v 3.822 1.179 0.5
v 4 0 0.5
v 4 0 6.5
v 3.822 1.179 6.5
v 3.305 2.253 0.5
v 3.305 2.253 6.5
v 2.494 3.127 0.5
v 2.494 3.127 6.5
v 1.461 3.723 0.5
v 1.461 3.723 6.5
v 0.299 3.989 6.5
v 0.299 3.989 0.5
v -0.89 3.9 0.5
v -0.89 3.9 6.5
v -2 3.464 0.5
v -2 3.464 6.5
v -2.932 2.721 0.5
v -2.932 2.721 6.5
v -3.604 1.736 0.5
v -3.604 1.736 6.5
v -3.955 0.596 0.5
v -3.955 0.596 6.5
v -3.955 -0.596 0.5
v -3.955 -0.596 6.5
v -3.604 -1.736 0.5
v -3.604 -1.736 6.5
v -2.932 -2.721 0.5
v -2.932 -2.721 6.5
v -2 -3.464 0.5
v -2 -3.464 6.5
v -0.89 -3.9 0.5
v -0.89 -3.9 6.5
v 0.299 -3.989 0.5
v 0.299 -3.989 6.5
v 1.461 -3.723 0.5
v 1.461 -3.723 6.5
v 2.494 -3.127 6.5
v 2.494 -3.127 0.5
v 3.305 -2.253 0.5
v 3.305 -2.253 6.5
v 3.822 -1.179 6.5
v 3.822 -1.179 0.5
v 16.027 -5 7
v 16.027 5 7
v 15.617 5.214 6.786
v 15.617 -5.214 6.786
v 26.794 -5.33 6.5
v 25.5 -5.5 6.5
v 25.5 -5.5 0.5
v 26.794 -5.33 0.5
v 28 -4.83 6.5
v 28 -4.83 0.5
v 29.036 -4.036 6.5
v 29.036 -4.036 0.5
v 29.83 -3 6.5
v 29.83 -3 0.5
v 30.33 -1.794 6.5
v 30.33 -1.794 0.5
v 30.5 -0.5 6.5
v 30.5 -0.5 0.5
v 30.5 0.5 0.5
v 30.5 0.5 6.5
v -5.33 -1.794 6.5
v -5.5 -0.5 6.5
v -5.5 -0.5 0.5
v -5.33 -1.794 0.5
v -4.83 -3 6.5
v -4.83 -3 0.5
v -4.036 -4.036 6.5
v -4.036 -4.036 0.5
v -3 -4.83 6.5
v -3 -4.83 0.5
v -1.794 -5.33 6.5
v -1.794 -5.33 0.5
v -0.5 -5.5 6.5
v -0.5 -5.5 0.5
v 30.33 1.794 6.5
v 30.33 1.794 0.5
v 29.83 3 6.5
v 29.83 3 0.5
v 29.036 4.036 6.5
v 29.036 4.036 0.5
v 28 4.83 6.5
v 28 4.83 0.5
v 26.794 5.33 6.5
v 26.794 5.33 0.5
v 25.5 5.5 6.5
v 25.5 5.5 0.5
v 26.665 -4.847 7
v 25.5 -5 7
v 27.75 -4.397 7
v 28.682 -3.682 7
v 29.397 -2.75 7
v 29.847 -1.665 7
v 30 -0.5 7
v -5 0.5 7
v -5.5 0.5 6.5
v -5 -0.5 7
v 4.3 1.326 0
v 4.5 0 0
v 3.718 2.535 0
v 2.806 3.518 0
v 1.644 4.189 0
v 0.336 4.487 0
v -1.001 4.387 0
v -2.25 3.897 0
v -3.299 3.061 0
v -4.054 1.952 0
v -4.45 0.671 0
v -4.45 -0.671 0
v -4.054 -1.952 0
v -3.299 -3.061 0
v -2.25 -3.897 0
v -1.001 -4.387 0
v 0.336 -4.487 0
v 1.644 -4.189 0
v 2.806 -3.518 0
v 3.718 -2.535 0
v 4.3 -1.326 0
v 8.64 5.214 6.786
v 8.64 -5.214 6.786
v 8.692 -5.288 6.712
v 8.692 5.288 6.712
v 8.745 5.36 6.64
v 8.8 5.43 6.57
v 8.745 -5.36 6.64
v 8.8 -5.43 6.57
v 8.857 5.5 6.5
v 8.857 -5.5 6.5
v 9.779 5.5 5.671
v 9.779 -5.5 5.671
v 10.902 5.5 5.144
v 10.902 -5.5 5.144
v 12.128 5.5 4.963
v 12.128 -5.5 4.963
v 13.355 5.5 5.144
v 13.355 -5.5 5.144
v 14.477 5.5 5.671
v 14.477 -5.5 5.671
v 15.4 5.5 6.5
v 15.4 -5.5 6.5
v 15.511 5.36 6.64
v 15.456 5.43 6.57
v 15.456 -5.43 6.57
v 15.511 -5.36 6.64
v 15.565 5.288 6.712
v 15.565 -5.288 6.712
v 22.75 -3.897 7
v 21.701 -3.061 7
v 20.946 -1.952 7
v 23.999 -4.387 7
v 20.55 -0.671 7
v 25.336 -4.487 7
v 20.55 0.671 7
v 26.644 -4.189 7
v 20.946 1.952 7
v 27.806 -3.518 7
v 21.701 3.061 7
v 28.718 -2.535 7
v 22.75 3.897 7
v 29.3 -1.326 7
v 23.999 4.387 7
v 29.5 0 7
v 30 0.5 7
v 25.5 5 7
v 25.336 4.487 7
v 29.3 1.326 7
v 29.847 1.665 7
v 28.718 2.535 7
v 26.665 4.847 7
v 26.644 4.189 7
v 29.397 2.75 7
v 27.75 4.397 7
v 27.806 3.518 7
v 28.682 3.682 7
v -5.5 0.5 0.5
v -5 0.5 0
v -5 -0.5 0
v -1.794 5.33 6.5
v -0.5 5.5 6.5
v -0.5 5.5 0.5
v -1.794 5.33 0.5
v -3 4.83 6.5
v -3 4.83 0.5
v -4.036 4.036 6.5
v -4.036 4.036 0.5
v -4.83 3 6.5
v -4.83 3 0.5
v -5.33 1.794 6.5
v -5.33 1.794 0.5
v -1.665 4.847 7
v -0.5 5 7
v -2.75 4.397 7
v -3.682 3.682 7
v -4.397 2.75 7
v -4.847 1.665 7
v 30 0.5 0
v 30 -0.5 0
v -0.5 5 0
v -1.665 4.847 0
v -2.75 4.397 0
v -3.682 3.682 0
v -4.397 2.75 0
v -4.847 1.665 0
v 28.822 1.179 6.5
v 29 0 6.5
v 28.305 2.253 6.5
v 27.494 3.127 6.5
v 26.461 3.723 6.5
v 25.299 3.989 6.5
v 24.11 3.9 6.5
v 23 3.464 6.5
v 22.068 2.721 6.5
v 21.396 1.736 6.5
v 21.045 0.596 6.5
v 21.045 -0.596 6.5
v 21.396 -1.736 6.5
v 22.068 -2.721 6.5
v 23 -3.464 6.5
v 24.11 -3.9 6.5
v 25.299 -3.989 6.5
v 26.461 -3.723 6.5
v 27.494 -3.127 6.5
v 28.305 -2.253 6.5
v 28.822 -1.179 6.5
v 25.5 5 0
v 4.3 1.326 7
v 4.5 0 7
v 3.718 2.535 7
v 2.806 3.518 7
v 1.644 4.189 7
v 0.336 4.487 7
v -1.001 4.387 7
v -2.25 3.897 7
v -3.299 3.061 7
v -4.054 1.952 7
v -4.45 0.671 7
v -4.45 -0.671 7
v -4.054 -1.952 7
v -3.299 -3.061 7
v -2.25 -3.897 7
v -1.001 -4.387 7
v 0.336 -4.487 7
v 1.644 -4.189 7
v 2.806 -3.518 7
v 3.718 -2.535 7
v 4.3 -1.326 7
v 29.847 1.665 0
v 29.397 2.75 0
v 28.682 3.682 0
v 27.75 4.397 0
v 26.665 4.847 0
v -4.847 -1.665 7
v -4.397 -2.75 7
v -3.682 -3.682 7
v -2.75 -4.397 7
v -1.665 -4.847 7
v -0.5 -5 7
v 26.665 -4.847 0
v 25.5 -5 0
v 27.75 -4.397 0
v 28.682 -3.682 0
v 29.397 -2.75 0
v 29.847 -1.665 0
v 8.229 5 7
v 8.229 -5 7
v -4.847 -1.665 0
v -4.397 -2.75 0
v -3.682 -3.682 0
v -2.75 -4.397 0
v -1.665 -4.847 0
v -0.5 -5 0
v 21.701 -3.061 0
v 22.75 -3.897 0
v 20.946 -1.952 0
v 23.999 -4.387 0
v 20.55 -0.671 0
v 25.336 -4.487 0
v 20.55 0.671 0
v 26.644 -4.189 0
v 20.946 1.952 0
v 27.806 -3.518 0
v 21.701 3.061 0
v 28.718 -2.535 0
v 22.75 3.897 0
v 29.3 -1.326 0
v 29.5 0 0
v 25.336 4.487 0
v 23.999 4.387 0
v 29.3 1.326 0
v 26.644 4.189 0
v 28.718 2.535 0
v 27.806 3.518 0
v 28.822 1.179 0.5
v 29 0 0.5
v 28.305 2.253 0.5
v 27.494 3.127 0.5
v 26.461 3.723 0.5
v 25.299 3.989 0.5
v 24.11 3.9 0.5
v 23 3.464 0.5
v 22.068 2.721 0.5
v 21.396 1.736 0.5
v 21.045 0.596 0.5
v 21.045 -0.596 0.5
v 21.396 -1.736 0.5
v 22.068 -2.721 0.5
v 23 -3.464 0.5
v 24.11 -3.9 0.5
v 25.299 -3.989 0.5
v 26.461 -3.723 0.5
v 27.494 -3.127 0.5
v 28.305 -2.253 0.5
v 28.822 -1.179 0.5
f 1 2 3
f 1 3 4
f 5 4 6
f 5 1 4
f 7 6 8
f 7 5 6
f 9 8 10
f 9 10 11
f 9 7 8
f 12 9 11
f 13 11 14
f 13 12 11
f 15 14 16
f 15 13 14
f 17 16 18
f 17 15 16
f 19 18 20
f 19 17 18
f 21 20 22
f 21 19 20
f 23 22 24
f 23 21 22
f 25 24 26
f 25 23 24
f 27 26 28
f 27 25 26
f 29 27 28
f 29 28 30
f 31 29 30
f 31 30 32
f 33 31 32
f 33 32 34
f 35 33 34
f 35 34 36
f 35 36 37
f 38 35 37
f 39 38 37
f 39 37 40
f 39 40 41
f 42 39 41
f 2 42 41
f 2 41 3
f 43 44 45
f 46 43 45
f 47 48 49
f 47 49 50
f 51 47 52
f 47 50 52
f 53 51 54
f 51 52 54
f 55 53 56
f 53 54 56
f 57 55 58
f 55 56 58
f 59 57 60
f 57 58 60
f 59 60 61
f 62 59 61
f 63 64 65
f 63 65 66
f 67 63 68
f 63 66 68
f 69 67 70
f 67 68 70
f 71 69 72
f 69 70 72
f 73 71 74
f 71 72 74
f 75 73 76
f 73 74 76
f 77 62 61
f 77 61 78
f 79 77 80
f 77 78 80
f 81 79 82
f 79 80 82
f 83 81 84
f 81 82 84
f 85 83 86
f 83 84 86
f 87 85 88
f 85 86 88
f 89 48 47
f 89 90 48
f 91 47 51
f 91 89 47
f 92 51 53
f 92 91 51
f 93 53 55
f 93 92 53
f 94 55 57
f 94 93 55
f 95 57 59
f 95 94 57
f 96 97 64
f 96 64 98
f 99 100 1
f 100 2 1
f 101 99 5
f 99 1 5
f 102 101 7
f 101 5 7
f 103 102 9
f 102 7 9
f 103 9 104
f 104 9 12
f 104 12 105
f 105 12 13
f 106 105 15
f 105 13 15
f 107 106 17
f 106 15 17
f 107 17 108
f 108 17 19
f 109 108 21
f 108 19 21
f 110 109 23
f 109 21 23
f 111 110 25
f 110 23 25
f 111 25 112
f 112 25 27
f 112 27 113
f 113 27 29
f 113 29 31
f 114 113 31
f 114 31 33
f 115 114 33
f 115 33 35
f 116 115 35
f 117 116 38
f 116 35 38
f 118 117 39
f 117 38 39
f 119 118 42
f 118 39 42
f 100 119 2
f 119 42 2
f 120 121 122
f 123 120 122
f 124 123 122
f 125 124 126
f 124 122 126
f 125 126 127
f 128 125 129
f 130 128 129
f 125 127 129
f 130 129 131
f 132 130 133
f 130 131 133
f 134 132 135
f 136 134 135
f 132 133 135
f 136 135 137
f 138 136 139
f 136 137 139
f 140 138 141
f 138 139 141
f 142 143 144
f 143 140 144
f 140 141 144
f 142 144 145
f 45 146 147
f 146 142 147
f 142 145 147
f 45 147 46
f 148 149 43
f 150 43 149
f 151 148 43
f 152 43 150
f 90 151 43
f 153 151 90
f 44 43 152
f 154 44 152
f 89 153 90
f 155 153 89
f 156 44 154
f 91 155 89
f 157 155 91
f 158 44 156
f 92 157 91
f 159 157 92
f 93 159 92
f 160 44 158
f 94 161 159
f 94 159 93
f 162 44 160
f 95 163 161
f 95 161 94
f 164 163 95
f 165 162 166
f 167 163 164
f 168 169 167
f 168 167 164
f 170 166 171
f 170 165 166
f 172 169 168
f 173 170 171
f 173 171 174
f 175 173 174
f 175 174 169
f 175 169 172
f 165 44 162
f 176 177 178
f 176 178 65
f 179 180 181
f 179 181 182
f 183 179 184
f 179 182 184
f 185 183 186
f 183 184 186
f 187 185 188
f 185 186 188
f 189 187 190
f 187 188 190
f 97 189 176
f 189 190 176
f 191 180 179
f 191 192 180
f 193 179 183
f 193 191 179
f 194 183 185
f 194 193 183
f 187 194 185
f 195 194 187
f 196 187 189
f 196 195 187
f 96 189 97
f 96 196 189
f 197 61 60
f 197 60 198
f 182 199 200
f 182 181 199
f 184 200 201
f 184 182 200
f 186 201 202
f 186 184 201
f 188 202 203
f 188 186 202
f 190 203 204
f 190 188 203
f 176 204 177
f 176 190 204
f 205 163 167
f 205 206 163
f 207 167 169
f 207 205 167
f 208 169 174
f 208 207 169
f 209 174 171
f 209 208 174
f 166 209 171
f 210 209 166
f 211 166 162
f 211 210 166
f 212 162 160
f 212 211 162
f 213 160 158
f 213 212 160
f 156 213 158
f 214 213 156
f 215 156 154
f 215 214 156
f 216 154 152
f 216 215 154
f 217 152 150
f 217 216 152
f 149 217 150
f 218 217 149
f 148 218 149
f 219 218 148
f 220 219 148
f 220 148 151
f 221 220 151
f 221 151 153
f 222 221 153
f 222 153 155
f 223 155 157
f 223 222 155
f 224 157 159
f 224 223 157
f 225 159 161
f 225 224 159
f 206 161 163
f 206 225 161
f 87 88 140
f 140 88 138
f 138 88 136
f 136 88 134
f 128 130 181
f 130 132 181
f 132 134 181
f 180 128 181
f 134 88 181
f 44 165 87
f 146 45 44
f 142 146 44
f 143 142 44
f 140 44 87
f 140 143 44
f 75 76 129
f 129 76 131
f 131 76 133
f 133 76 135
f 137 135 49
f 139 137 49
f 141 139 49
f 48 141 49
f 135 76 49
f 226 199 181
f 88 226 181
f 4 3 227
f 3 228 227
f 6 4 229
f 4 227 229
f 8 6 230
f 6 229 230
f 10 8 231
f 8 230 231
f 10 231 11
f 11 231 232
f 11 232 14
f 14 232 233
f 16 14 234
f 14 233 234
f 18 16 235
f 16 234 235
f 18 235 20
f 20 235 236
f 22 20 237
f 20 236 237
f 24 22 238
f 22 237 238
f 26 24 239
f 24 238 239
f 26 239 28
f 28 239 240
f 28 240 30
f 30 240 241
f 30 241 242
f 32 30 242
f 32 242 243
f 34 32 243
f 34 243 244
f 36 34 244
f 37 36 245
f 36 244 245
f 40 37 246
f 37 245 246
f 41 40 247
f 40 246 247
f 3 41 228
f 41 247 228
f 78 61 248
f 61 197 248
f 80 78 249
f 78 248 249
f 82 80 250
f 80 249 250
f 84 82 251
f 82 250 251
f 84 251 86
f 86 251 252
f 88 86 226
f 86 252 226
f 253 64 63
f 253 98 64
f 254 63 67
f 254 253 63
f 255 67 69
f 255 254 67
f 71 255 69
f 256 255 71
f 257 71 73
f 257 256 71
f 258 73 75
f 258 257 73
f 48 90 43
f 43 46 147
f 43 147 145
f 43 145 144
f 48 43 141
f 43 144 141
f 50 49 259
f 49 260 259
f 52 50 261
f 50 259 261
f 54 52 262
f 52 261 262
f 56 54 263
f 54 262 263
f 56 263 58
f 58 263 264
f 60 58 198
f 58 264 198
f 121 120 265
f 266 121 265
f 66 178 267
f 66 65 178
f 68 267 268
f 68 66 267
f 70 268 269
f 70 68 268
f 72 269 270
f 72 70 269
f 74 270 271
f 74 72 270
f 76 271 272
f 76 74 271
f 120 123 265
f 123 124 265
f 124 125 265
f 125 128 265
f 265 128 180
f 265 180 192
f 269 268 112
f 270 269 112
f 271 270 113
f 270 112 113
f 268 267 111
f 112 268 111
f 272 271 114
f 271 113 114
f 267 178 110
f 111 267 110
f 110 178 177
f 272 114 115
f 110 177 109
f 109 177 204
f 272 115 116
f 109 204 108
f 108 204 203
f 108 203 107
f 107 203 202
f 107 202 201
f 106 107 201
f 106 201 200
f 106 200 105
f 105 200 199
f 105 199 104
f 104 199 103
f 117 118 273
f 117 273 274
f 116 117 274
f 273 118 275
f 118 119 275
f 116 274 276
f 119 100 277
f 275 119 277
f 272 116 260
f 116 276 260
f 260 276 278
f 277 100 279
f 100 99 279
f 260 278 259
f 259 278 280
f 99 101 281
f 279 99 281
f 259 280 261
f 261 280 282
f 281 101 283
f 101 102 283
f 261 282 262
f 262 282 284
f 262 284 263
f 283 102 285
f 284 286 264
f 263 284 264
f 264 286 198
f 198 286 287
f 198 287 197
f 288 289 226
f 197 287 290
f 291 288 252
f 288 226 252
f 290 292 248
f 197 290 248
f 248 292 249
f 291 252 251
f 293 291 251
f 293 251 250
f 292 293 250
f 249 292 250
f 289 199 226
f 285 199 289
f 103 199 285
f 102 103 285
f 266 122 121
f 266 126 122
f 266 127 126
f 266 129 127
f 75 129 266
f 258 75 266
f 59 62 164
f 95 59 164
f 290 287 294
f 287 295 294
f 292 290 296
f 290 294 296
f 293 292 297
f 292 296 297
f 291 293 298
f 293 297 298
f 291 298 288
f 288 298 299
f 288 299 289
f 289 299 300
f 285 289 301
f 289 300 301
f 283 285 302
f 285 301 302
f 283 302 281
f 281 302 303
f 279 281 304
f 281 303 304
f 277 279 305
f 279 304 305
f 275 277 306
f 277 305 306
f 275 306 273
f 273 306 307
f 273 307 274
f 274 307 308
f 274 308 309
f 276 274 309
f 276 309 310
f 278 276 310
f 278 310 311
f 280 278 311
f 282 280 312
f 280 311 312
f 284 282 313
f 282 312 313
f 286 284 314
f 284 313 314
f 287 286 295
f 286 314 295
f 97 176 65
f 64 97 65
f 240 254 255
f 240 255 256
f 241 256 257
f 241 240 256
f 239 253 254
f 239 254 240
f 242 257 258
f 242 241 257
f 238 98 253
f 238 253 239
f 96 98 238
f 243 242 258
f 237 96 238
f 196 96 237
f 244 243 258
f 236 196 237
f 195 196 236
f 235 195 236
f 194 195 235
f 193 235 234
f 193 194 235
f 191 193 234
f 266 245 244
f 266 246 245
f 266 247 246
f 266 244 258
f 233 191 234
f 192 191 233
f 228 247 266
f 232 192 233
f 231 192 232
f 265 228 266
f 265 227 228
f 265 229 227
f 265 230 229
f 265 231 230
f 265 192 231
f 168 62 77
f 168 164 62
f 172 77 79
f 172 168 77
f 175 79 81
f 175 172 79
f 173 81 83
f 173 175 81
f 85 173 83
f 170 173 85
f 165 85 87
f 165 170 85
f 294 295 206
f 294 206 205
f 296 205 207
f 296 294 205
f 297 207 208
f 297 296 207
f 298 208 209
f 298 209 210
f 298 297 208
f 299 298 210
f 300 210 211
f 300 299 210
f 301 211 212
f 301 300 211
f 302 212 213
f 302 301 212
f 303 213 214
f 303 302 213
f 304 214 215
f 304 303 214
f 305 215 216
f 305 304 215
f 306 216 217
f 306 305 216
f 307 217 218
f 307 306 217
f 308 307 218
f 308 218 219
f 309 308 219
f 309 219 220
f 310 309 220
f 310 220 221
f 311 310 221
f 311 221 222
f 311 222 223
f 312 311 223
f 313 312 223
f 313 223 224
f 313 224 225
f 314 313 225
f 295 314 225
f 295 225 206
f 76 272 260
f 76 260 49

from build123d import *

# Parameters (mm, degrees)
F0_R         = 4
F1_DEPTH     = 7
F3_DEPTH     = 25
F4_T1_DEPTH  = 26
F4_T3_DEPTH  = 1
F4_T5_DEPTH  = 10.285841494
F4_T7_DEPTH  = 12.4424386412
F4_T9_DEPTH  = 11.029084367
F4_T12_ANGLE = 90
F4_T14_ANGLE = 90
F4_T16_ANGLE = 90
F4_T18_ANGLE = 90
F4_T24_ANGLE = 90
F4_T26_ANGLE = 90
F4_T30_ANGLE = 90
F4_T32_ANGLE = 90


# Not quite as in the source:
# - a fillet or chamfer that OpenCascade refuses, or shapes differently, is made with other operations: its cross-section is extruded or revolved along the edge and cut away or added


with BuildPart() as f1:
    # F0 (on Top) → F1 (new body)
    with BuildSketch(Plane.XY):
        with BuildLine():
            Line((25.5, 5.5), (-0.5, 5.5))
            ThreePointArc((-0.5, 5.5), (-4.0355339059, 4.0355339059), (-5.5, 0.5))
            Line((-5.5, 0.5), (-5.5, -0.5))
            ThreePointArc((-5.5, -0.5), (-4.0355339059, -4.0355339059), (-0.5, -5.5))
            Line((-0.5, -5.5), (25.5, -5.5))
            ThreePointArc((25.5, -5.5), (29.0355339059, -4.0355339059), (30.5, -0.5))
            Line((30.5, -0.5), (30.5, 0.5))
            ThreePointArc((30.5, 0.5), (29.0355339059, 4.0355339059), (25.5, 5.5))
        make_face()
        Circle(F0_R, mode=Mode.SUBTRACT)
        with Locations((25, 0)):
            Circle(F0_R, mode=Mode.SUBTRACT)
    extrude(amount=F1_DEPTH)

    # F2 (on face) → F3 (cut)
    with BuildSketch(Plane.XZ.offset(5.5)):
        with BuildLine():
            Line((15.756757127, 7), (8.5, 7))
            ThreePointArc((8.5, 7), (12.1283785635, 4.963), (15.756757127, 7))
        make_face()
    extrude(amount=-F3_DEPTH, mode=Mode.SUBTRACT)

    # F4: chamfer of 0.5 on 24 edges, made by hand

    # F4_s2 → F4_t1 (cut)
    with BuildSketch(Plane.YZ.offset(-0.5)):
        Polygon((-5, 0), (-5.5, 0.5), (-5.5, 0), align=None)
        Polygon((5, 0), (5.5, 0.5), (5.5, 0), align=None)
    extrude(amount=F4_T1_DEPTH, mode=Mode.SUBTRACT)

    # F4_s4 → F4_t3 (cut)
    with BuildSketch(Plane.XZ.offset(-0.5)):
        Polygon((30.5, 0.5), (30, 0), (30.5, 0), align=None)
        Polygon((-5, 0), (-5.5, 0.5), (-5.5, 0), align=None)
        Polygon((-5.5, 6.5), (-5, 7), (-5.5, 7), align=None)
        Polygon((30.5, 6.5), (30, 7), (30.5, 7), align=None)
    extrude(amount=F4_T3_DEPTH, mode=Mode.SUBTRACT)

    # F4_s6 → F4_t5 (cut)
    with BuildSketch(Plane.YZ.offset(-0.5)):
        Polygon((-5.5, 6.5), (-5, 7), (-5.5, 7), align=None)
        Polygon((5.5, 6.5), (5, 7), (5.5, 7), align=None)
    extrude(amount=F4_T5_DEPTH, mode=Mode.SUBTRACT)

    # F4_s8 → F4_t7 (cut)
    with BuildSketch(Plane.XZ.offset(-6.2212193206)):
        with BuildLine():
            Line((8.6398076479, 6.7855789474), (8.2293875402, 7))
            Line((8.2293875402, 7), (8.5, 7))
            ThreePointArc((8.5, 7), (8.5730669131, 6.8844255286), (8.6398076479, 6.7855789474))
        make_face()
        with BuildLine():
            Line((16.0273695868, 7), (15.6169494791, 6.7855789474))
            ThreePointArc((15.6169494791, 6.7855789474), (15.6836902138, 6.8844255286), (15.756757127, 7))
            Line((15.756757127, 7), (16.0273695868, 7))
        make_face()
    extrude(amount=F4_T7_DEPTH, mode=Mode.SUBTRACT)

    # F4_s10 → F4_t9 (cut)
    with BuildSketch(Plane.YZ.offset(14.470915633)):
        Polygon((-5, 7), (-5.5, 6.5), (-5.5, 7), align=None)
        Polygon((5, 7), (5.5, 6.5), (5.5, 7), align=None)
    extrude(amount=F4_T9_DEPTH, mode=Mode.SUBTRACT)

    # F4_s11 → F4_t12 (revolve, cut)
    with BuildSketch(Plane.XZ.offset(-0.5)):
        Polygon((30.5, 0.5), (30, 0), (30.5, 0), align=None)
    revolve(axis=Axis((25.5, 0.5, 0), (0, 0, 1)), revolution_arc=F4_T12_ANGLE, mode=Mode.SUBTRACT)

    # F4_s13 → F4_t14 (revolve, cut)
    with BuildSketch(Plane.YZ.offset(-0.5)):
        Polygon((5, 0), (5.5, 0.5), (5.5, 0), align=None)
    revolve(axis=Axis((-0.5, 0.5, 0), (0, 0, 1)), revolution_arc=F4_T14_ANGLE, mode=Mode.SUBTRACT)

    # F4_s15 → F4_t16 (revolve, cut)
    with BuildSketch(Plane.XZ.offset(0.5)):
        Polygon((-5, 0), (-5.5, 0.5), (-5.5, 0), align=None)
    revolve(axis=Axis((-0.5, -0.5, 0), (0, 0, 1)), revolution_arc=F4_T16_ANGLE, mode=Mode.SUBTRACT)

    # F4_s17 → F4_t18 (revolve, cut)
    with BuildSketch(Plane.YZ.offset(25.5)):
        Polygon((-5.5, 0.5), (-5, 0), (-5.5, 0), align=None)
    revolve(axis=Axis((25.5, -0.5, 0), (0, 0, 1)), revolution_arc=F4_T18_ANGLE, mode=Mode.SUBTRACT)

    # F4_s19 → F4_t20 (revolve, cut)
    with BuildSketch(Plane.XZ):
        Polygon((4.5, 0), (4, 0.5), (4, 0), align=None)
    revolve(axis=Axis((0, 0, 0), (0, 0, 1)), mode=Mode.SUBTRACT)

    # F4_s21 → F4_t22 (revolve, cut)
    with BuildSketch(Plane.XZ):
        Polygon((29.5, 0), (29, 0.5), (29, 0), align=None)
    revolve(axis=Axis((25, 0, 0), (0, 0, 1)), mode=Mode.SUBTRACT)

    # F4_s23 → F4_t24 (revolve, cut)
    with BuildSketch(Plane.XZ.offset(0.5)):
        Polygon((-5.5, 6.5), (-5, 7), (-5.5, 7), align=None)
    revolve(axis=Axis((-0.5, -0.5, 7), (0, 0, 1)), revolution_arc=F4_T24_ANGLE, mode=Mode.SUBTRACT)

    # F4_s25 → F4_t26 (revolve, cut)
    with BuildSketch(Plane.YZ.offset(-0.5)):
        Polygon((5.5, 6.5), (5, 7), (5.5, 7), align=None)
    revolve(axis=Axis((-0.5, 0.5, 7), (0, 0, 1)), revolution_arc=F4_T26_ANGLE, mode=Mode.SUBTRACT)

    # F4_s27 → F4_t28 (revolve, cut)
    with BuildSketch(Plane.XZ):
        Polygon((4, 6.5), (4.5, 7), (4, 7), align=None)
    revolve(axis=Axis((0, 0, 7), (0, 0, 1)), mode=Mode.SUBTRACT)

    # F4_s29 → F4_t30 (revolve, cut)
    with BuildSketch(Plane.YZ.offset(25.5)):
        Polygon((-5.5, 6.5), (-5, 7), (-5.5, 7), align=None)
    revolve(axis=Axis((25.5, -0.5, 7), (0, 0, 1)), revolution_arc=F4_T30_ANGLE, mode=Mode.SUBTRACT)

    # F4_s31 → F4_t32 (revolve, cut)
    with BuildSketch(Plane.XZ.offset(-0.5)):
        Polygon((30.5, 6.5), (30, 7), (30.5, 7), align=None)
    revolve(axis=Axis((25.5, 0.5, 7), (0, 0, 1)), revolution_arc=F4_T32_ANGLE, mode=Mode.SUBTRACT)

    # F4_s33 → F4_t34 (revolve, cut)
    with BuildSketch(Plane.XZ):
        Polygon((29.5, 7), (29, 6.5), (29, 7), align=None)
    revolve(axis=Axis((25, 0, 7), (0, 0, 1)), mode=Mode.SUBTRACT)


solid = f1.part
